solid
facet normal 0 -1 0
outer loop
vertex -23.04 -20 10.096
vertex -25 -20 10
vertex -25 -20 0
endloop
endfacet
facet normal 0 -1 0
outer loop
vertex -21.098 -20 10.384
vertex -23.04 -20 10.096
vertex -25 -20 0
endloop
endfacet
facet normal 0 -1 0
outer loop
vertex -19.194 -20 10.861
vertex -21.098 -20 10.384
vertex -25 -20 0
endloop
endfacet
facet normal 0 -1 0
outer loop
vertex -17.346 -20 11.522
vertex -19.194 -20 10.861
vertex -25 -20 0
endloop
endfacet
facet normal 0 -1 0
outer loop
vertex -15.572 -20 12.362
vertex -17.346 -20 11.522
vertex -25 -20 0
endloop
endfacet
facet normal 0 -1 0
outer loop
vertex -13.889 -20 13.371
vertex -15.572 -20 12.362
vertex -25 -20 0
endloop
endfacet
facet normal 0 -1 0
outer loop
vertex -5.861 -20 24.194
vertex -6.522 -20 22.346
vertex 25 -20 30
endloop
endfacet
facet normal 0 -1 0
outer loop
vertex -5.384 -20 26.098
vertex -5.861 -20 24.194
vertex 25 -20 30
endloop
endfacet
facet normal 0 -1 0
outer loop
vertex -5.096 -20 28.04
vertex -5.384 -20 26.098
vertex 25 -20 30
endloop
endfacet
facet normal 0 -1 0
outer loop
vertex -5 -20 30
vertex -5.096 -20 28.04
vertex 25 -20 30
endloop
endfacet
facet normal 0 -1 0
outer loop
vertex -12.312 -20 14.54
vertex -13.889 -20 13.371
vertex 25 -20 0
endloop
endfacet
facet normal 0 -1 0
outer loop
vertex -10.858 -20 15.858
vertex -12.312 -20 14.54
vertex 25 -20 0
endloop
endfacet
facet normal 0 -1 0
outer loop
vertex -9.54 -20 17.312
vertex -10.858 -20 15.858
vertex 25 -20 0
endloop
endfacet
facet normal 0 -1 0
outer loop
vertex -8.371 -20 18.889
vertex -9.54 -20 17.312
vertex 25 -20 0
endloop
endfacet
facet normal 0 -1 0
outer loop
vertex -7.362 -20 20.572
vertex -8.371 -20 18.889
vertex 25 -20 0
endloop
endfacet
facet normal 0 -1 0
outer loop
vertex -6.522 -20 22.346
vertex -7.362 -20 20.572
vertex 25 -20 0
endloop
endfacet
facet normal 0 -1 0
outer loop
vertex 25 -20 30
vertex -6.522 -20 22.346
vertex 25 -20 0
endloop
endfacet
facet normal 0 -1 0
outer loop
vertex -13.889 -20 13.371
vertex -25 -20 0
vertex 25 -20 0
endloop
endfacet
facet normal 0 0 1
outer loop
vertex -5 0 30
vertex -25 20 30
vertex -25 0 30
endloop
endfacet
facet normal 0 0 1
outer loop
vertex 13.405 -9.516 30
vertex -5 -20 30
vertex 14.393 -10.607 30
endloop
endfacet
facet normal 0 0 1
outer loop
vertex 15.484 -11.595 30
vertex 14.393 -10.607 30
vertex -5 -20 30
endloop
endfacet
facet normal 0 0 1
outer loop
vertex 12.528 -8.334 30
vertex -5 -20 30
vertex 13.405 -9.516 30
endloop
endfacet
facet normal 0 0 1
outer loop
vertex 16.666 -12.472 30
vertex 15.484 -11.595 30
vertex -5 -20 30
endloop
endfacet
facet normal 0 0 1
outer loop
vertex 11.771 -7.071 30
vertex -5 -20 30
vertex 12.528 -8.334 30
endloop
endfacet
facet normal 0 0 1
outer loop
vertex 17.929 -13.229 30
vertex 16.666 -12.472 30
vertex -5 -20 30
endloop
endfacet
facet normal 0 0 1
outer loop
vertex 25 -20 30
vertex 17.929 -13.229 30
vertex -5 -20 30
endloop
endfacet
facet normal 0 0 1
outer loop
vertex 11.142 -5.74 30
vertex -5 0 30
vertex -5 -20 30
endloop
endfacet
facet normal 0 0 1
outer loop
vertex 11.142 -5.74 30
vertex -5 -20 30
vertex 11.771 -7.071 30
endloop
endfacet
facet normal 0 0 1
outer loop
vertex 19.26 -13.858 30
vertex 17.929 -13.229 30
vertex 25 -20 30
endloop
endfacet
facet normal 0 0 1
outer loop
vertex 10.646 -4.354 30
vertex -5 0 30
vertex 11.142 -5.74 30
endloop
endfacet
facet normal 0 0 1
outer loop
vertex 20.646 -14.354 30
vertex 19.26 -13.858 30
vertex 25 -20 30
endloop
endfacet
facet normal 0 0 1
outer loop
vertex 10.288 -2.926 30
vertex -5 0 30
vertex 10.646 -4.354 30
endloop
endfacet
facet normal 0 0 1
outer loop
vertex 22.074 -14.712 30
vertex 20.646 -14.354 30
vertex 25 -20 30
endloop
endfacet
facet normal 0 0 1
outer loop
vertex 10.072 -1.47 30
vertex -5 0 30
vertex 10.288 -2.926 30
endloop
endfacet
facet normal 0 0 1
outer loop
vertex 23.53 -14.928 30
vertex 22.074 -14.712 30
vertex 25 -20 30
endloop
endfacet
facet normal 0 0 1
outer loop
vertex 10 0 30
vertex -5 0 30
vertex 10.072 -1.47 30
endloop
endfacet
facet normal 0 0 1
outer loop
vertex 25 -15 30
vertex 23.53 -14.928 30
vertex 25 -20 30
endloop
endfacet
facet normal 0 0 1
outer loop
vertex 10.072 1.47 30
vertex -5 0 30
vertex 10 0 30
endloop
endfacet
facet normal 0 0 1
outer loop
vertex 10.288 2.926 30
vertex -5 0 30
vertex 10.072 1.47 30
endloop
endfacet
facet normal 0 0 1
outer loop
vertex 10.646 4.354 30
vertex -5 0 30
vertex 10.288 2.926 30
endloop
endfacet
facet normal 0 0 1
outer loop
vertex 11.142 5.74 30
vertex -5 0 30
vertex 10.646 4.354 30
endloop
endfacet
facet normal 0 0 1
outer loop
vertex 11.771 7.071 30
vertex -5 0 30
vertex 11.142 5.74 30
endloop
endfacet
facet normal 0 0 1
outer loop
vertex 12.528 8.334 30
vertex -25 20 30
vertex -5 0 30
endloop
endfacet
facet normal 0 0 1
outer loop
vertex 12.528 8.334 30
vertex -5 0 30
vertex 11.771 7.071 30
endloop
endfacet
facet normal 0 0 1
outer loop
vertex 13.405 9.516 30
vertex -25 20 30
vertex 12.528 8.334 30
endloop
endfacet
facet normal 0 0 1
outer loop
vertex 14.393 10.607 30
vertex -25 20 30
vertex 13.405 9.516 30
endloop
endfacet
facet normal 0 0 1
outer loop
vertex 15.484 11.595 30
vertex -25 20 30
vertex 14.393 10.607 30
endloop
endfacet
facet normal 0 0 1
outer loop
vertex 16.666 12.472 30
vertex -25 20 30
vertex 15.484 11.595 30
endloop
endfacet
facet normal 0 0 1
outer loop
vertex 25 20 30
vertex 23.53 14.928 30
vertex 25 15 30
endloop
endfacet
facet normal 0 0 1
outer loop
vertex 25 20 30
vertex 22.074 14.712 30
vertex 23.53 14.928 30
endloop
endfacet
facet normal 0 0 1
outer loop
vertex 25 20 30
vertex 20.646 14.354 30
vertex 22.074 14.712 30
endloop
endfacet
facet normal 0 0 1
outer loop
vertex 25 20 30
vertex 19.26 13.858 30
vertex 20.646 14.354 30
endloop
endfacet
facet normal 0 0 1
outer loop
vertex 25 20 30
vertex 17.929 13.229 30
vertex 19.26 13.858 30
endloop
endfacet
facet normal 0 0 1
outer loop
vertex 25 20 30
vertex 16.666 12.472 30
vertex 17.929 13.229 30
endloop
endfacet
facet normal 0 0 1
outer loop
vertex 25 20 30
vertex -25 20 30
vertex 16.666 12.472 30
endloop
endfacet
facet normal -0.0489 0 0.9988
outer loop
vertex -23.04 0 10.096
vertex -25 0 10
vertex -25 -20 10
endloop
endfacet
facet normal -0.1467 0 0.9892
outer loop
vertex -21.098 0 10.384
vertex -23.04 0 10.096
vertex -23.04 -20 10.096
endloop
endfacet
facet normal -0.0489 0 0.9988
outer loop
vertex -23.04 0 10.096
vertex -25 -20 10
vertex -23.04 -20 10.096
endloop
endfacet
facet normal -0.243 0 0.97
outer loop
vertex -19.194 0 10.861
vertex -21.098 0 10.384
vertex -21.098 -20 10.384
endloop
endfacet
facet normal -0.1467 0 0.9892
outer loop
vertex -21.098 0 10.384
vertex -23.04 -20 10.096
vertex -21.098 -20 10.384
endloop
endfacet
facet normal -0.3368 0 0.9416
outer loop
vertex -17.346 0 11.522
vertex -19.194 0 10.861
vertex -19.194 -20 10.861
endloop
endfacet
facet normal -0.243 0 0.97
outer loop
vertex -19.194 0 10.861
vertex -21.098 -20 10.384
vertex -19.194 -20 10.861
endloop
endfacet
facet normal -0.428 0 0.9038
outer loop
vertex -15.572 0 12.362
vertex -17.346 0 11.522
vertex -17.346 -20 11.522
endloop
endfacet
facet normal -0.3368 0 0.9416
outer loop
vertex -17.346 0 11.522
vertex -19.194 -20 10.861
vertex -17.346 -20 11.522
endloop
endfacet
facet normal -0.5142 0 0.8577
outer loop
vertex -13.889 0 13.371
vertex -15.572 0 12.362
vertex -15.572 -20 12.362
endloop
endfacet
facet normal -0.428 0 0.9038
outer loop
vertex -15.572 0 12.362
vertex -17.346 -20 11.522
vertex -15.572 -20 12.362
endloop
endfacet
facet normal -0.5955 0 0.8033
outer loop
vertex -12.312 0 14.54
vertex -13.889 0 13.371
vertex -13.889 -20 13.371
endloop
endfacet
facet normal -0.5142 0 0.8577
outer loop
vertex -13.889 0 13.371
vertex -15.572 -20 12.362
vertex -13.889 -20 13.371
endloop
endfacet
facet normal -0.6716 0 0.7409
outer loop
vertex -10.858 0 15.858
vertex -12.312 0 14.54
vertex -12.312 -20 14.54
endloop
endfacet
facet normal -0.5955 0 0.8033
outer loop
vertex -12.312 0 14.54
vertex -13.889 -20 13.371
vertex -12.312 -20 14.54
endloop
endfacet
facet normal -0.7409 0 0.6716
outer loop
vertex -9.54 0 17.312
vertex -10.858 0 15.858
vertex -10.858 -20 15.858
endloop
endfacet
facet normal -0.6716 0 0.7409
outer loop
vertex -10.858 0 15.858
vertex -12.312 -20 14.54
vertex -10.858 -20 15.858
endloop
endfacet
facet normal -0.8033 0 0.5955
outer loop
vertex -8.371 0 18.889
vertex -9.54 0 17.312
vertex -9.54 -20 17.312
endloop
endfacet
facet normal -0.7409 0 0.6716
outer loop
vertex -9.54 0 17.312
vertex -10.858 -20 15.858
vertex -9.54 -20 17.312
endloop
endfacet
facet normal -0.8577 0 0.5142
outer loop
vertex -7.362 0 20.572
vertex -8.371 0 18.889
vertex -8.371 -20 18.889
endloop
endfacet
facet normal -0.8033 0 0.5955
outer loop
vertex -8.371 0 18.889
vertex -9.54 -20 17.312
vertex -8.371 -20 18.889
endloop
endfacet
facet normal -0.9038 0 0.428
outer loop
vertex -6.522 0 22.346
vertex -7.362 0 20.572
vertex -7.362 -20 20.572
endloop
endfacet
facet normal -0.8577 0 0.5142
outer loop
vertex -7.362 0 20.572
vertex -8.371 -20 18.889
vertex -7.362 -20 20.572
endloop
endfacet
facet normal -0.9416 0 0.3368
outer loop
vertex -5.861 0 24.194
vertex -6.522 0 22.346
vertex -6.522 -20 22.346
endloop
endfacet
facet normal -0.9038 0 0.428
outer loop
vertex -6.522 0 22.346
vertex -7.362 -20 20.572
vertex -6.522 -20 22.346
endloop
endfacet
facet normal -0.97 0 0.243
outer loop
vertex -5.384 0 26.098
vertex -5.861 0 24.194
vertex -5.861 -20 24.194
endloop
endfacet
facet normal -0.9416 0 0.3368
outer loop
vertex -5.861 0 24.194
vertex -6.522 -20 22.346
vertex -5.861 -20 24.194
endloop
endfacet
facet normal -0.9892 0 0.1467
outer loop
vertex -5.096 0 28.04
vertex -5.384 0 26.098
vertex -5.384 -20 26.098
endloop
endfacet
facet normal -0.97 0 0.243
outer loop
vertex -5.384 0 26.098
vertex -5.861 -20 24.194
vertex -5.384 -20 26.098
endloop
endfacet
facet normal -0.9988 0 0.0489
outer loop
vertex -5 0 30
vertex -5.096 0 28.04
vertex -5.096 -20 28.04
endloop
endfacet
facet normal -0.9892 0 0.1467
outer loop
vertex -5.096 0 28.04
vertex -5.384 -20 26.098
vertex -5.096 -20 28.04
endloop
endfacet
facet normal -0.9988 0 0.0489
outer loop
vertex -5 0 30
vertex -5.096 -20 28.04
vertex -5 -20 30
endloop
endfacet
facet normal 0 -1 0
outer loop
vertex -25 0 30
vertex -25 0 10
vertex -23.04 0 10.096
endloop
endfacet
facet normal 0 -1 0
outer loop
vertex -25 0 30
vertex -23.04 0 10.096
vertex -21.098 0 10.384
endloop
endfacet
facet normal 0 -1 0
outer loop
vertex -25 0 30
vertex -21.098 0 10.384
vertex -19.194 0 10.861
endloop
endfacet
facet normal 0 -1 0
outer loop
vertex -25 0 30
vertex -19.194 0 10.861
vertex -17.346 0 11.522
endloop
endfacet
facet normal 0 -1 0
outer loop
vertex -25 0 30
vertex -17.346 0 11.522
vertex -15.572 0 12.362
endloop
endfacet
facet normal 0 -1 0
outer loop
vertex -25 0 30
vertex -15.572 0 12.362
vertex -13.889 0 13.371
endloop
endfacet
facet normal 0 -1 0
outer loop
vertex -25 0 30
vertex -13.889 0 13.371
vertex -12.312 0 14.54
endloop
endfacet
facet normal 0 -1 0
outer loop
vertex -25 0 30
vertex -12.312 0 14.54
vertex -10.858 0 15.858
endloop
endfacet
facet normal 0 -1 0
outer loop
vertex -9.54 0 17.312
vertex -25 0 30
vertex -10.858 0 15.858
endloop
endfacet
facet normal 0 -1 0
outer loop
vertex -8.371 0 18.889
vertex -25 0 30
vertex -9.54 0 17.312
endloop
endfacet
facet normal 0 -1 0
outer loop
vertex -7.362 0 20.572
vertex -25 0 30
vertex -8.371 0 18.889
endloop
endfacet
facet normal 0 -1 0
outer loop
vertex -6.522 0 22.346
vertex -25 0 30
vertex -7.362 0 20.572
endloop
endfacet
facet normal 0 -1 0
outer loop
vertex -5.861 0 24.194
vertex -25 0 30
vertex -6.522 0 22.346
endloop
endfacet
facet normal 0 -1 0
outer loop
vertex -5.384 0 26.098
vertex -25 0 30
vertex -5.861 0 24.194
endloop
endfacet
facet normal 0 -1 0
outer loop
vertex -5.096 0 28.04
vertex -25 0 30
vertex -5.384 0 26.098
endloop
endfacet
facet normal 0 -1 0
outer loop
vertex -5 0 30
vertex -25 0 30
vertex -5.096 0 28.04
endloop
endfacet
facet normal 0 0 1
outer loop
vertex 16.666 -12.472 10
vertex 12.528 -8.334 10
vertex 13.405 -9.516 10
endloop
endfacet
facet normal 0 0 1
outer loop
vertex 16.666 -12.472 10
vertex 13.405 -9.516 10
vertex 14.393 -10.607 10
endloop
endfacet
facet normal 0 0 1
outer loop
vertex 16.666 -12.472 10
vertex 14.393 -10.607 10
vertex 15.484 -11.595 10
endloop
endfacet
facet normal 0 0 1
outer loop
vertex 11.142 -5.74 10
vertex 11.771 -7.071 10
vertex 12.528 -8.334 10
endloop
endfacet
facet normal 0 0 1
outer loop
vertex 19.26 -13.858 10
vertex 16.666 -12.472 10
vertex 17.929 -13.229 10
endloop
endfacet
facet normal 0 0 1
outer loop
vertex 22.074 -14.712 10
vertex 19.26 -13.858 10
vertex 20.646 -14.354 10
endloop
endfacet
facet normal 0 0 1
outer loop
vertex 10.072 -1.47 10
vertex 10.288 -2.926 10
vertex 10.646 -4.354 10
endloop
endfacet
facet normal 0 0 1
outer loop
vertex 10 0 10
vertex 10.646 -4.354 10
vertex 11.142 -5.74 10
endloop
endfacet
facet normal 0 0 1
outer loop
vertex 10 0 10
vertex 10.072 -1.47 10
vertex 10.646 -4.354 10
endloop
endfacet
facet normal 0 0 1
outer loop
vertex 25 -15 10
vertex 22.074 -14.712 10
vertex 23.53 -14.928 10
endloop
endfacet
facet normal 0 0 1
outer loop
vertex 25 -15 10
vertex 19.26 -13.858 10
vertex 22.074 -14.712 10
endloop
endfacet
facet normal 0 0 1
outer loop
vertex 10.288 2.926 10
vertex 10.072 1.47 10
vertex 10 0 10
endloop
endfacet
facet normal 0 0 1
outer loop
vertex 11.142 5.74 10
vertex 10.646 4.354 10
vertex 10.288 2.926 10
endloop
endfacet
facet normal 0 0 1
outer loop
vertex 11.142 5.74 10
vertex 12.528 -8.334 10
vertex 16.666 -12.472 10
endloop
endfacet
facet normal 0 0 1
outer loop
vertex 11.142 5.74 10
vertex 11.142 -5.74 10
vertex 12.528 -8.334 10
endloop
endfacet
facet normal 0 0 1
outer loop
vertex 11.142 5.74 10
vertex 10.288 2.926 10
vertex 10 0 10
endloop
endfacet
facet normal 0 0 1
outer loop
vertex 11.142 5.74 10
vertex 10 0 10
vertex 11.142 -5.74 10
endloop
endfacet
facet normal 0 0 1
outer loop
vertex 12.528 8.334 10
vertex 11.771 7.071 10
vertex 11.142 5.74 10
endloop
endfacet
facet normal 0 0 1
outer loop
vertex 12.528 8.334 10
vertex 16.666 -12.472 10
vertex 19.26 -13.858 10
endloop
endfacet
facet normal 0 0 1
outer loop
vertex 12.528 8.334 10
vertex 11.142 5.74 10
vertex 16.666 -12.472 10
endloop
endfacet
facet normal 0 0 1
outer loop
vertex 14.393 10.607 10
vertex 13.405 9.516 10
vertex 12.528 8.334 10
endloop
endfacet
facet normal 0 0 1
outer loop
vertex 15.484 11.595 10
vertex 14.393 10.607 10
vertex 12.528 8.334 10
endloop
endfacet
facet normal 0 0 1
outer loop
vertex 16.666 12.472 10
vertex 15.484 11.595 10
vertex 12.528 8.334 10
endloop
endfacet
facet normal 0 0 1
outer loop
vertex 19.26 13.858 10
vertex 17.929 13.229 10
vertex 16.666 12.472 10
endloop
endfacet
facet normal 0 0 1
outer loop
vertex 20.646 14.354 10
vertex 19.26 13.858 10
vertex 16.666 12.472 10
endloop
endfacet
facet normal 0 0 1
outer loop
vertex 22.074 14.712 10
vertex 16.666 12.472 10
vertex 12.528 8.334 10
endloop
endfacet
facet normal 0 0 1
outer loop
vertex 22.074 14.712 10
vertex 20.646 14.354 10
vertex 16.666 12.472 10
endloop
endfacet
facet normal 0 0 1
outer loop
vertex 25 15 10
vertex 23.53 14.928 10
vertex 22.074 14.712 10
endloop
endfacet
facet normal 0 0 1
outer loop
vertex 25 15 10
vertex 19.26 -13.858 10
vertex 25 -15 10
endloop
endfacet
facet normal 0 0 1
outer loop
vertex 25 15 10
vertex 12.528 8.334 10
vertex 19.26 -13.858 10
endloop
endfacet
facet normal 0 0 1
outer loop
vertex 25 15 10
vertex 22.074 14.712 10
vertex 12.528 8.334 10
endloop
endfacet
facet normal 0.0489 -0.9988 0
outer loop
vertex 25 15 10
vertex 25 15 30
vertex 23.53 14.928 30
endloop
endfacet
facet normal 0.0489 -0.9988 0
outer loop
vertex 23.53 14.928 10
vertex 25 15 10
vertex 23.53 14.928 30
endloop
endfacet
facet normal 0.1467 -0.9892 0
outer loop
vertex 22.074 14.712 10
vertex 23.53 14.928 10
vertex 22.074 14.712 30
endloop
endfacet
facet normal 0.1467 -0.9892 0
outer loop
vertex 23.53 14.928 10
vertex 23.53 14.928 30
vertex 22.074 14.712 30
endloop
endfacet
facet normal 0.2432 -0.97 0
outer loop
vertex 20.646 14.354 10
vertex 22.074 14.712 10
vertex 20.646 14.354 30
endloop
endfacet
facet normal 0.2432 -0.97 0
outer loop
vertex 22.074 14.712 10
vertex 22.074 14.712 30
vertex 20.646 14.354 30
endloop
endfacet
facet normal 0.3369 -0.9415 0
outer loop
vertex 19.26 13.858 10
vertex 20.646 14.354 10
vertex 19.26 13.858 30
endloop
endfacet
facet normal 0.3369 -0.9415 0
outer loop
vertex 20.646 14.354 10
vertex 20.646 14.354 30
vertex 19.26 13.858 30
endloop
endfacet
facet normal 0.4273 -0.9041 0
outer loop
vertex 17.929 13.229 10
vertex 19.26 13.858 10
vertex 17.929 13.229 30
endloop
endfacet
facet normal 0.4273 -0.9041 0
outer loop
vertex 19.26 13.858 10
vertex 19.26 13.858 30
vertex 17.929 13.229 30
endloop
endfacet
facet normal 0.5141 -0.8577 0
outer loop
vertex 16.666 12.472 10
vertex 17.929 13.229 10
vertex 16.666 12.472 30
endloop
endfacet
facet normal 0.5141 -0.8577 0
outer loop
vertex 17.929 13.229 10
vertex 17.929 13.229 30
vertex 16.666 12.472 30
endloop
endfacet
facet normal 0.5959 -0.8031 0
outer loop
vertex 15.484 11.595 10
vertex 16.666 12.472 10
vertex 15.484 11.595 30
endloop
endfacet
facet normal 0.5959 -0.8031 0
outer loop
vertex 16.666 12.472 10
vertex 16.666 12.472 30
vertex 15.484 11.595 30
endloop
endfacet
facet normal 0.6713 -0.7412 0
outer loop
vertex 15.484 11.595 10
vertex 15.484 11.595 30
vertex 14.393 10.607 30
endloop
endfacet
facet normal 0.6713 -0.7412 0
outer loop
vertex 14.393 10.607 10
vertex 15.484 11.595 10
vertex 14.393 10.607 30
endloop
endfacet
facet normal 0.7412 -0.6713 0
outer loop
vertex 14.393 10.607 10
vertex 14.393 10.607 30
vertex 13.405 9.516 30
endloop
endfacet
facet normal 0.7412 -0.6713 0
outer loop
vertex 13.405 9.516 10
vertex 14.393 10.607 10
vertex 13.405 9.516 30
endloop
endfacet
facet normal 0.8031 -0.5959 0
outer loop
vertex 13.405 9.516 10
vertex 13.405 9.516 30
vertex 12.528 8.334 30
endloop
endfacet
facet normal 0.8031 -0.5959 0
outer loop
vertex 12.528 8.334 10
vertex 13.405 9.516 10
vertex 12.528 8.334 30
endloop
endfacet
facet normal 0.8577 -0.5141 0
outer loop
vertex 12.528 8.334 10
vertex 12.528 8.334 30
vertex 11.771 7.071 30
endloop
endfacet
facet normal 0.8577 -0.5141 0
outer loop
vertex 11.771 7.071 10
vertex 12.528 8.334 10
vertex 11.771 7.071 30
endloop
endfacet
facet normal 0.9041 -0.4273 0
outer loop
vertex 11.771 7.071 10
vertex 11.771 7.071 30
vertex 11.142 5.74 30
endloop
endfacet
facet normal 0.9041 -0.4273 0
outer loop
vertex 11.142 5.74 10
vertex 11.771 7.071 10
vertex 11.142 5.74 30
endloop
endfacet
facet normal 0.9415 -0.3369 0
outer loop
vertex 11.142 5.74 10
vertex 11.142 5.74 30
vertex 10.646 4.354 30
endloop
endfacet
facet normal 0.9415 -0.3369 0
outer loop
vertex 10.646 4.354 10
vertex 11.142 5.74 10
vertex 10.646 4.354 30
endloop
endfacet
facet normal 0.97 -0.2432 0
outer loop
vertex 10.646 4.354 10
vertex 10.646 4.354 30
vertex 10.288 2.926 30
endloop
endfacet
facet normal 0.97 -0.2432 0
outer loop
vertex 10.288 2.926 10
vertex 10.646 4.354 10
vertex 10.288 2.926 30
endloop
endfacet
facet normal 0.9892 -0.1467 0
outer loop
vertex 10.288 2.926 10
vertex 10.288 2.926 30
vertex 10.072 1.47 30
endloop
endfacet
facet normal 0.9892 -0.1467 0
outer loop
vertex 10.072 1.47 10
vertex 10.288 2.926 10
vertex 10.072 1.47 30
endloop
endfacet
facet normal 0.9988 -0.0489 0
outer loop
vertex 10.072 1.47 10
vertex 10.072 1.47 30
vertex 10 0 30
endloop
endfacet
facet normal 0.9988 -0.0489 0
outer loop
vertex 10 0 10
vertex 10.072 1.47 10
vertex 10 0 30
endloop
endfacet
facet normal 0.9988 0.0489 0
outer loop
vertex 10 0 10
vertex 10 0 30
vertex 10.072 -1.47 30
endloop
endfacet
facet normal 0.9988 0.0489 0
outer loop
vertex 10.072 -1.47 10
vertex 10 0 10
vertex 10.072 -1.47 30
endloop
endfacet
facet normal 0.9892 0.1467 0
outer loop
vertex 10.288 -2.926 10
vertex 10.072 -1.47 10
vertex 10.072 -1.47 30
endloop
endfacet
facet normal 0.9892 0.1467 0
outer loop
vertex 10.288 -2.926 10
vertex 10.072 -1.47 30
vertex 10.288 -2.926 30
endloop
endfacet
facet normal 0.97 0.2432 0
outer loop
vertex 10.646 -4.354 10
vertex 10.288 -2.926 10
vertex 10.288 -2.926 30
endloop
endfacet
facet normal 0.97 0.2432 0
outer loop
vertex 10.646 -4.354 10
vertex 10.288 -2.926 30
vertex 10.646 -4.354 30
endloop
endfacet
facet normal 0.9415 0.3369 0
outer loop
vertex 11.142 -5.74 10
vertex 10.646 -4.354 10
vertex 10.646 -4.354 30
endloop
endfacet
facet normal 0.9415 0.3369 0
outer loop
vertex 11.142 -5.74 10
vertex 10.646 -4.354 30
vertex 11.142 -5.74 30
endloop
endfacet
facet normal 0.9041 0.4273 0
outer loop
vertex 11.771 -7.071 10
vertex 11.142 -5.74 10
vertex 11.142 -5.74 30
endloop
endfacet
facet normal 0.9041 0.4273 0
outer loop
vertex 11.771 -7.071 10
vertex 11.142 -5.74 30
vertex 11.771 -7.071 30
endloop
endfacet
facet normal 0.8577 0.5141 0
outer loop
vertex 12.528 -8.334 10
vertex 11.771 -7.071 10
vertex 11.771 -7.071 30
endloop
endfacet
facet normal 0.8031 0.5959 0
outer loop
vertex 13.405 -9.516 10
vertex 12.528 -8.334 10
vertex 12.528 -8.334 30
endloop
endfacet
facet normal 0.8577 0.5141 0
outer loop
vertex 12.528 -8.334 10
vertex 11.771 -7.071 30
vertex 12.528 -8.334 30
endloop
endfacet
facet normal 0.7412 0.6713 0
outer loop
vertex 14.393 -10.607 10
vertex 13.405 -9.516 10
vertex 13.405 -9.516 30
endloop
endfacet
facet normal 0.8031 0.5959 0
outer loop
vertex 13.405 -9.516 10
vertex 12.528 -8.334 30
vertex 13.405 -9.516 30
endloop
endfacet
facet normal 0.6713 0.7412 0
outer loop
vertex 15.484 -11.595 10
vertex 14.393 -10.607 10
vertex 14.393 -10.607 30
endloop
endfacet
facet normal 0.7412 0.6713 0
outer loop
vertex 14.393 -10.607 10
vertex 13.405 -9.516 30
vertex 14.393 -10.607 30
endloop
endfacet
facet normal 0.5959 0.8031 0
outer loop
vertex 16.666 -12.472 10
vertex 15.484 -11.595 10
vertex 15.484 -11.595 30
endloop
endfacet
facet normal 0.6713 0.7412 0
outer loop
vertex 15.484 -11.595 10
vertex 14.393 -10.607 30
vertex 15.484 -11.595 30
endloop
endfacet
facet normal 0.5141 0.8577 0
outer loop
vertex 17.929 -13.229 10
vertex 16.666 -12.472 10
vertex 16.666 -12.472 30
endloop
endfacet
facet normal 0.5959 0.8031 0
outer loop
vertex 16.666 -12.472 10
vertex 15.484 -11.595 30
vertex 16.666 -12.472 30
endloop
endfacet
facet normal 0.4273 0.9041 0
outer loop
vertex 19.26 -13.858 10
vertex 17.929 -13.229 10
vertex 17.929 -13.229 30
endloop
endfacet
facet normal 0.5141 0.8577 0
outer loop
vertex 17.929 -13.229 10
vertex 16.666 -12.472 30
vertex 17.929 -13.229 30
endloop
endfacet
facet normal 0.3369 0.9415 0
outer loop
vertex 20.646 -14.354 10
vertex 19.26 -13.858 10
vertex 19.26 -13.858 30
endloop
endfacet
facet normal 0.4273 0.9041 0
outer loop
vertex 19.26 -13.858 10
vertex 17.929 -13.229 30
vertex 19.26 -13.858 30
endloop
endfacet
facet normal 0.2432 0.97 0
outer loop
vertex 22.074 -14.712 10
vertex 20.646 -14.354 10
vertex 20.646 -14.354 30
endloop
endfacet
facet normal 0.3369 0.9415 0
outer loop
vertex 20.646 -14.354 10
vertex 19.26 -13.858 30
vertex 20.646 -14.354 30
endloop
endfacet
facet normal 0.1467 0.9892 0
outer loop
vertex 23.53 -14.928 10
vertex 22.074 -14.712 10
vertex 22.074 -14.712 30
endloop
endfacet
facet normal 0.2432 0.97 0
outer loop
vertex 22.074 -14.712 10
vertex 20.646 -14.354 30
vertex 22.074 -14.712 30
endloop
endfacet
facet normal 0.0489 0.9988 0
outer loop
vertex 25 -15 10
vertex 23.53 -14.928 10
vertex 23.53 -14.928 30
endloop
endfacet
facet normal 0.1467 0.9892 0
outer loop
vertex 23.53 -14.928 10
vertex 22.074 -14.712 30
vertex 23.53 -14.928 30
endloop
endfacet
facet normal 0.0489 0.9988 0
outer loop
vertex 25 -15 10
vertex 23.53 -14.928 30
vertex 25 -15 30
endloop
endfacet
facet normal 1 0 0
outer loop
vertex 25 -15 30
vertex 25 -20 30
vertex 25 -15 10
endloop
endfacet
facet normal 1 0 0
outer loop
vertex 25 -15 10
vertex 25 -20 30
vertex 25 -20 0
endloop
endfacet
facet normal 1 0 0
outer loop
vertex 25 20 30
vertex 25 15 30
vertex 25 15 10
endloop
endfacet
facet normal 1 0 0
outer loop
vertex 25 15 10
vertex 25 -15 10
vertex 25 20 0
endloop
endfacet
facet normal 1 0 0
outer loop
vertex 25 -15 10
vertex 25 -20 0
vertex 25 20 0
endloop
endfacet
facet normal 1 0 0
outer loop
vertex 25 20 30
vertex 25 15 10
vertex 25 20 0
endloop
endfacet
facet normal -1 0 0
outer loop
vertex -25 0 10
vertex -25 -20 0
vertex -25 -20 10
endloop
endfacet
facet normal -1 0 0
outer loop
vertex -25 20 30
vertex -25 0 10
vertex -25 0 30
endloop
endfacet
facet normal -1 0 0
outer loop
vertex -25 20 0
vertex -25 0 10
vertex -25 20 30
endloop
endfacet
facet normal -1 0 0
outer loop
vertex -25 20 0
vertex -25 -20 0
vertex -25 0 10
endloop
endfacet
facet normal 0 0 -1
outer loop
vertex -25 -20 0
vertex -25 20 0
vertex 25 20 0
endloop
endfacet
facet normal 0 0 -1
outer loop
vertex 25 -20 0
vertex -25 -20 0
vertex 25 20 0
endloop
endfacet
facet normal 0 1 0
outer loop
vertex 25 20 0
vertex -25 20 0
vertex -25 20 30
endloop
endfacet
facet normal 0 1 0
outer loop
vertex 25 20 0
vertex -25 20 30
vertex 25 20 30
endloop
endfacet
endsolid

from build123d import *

# Parameters (mm, degrees)
F0_W     = 50
F0_H     = 40
F1_DEPTH = 30
F2_R     = 20
F3_DEPTH = 20
F4_R     = 15
F5_DEPTH = 20


with BuildPart() as f1:
    # F0 (on Top) → F1 (new body)
    with BuildSketch(Plane.XY):
        Rectangle(F0_W, F0_H)
    extrude(amount=F1_DEPTH)

    # F2 (on face) → F3 (cut)
    with BuildSketch(Plane.XZ.offset(20)):
        with Locations((-25, 30)):
            Circle(F2_R)
    extrude(amount=-F3_DEPTH, mode=Mode.SUBTRACT)

    # F4 (on face) → F5 (cut)
    with BuildSketch(Plane.XY.offset(30)):
        with Locations((25, 0)):
            Circle(F4_R)
    extrude(amount=-F5_DEPTH, mode=Mode.SUBTRACT)


solid = f1.part
